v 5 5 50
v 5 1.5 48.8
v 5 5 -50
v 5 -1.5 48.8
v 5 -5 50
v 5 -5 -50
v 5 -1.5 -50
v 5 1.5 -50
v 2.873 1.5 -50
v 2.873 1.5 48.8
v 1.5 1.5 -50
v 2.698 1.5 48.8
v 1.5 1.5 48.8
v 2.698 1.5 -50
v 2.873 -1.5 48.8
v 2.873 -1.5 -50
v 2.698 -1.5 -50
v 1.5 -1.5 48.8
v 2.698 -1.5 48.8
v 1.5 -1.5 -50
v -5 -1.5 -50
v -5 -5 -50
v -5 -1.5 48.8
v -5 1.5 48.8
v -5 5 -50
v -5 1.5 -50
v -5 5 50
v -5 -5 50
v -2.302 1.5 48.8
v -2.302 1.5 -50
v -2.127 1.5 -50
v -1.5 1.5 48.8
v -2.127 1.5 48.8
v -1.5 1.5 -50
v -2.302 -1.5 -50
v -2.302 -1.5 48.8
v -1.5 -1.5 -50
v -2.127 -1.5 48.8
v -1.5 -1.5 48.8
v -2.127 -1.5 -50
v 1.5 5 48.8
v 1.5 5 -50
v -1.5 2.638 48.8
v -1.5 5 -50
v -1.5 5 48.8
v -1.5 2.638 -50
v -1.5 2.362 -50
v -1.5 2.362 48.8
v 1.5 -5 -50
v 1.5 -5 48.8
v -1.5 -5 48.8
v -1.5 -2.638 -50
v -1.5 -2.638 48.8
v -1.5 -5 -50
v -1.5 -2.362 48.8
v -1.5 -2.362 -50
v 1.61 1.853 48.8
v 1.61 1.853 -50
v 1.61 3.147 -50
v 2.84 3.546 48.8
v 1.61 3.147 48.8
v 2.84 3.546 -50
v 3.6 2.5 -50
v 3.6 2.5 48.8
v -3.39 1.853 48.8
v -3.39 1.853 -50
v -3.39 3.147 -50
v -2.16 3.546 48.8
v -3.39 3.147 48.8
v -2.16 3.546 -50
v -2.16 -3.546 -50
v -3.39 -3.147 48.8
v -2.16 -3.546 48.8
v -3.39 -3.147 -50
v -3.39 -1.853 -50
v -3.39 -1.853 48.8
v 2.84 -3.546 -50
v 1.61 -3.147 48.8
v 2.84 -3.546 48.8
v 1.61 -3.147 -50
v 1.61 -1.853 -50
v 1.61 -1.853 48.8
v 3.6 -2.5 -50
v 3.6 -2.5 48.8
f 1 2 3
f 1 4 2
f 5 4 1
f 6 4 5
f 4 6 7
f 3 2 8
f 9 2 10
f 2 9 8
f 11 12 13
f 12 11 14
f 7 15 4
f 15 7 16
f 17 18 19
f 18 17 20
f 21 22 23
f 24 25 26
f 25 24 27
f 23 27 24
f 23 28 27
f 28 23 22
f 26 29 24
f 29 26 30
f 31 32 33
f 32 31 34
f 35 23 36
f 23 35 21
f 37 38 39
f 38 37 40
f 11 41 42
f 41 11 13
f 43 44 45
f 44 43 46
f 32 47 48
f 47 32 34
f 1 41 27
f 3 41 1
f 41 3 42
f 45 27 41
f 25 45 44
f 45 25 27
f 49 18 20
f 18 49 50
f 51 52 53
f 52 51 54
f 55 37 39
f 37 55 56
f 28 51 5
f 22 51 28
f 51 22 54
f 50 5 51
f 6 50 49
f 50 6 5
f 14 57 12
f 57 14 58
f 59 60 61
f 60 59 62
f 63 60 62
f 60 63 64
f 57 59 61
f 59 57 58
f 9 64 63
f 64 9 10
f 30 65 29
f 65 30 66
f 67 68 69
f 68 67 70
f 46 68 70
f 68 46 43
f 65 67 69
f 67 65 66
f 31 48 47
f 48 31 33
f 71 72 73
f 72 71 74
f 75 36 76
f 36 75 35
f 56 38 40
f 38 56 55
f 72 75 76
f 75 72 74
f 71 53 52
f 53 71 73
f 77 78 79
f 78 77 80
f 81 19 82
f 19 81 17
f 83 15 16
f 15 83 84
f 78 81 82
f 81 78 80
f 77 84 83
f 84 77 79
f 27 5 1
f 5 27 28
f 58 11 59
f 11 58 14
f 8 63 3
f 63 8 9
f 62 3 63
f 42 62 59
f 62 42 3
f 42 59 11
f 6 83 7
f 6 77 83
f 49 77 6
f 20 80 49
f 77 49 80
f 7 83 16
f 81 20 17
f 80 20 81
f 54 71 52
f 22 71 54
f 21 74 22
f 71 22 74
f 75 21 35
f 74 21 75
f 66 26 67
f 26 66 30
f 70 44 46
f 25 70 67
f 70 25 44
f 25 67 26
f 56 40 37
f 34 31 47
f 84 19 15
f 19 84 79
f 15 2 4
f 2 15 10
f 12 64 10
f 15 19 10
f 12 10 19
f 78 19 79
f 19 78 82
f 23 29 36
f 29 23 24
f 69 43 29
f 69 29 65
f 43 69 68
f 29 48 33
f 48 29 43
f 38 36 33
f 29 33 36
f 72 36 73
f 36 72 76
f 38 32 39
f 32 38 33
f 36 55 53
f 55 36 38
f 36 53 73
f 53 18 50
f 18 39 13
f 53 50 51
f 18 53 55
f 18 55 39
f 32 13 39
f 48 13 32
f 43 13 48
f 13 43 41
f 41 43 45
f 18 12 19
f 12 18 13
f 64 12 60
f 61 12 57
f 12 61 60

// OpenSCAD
// Parameters
cross_section_width_mm = 10; //[5:20:0.5]
cross_section_height_mm = 10; //[5:20:0.5]
length_mm = 100; //[50:200:1]
centered = 1; //[0:1:1]
corner_hole = 1; //[0:1:1]
wall_thickness_mm = 1.2; //[0.6:2.4:0.1]
slot_opening_mm = 3.0; //[1.5:5.0:0.1]
slot_depth_mm = 2.8; //[1.5:4.5:0.1]
center_bore_diameter_mm = 4.2; //[2.0:7.0:0.1]
corner_hole_diameter_mm = 2.2; //[1.0:4.0:0.1]
corner_hole_inset_mm = 2.5; //[1.5:4.0:0.1]
overlap_mm = 1.0; //[0.5:2.0:0.1]

// Extrusion - complete geometry
module extrusion() {
  color("Silver") {
    difference() {
      // Main body
      cube([cross_section_width_mm, cross_section_height_mm, length_mm], center=true);
      
      // T-slot channels
      union() {
        translate([cross_section_width_mm/2 - (slot_depth_mm + overlap_mm)/2, 0, 0])
          cube([slot_depth_mm + overlap_mm, slot_opening_mm, length_mm + 2*overlap_mm], center=true);
        translate([-cross_section_width_mm/2 + (slot_depth_mm + overlap_mm)/2, 0, 0])
          cube([slot_depth_mm + overlap_mm, slot_opening_mm, length_mm + 2*overlap_mm], center=true);
        translate([0, cross_section_height_mm/2 - (slot_depth_mm + overlap_mm)/2, 0])
          cube([slot_opening_mm, slot_depth_mm + overlap_mm, length_mm + 2*overlap_mm], center=true);
        translate([0, -cross_section_height_mm/2 + (slot_depth_mm + overlap_mm)/2, 0])
          cube([slot_opening_mm, slot_depth_mm + overlap_mm, length_mm + 2*overlap_mm], center=true);
      }
      
      // Center bore
      translate([0, 0, 0])
        cylinder(r=center_bore_diameter_mm/2, h=length_mm + 2*overlap_mm, center=true);
      
      // Corner holes
      if (corner_hole) {
        union() {
          translate([cross_section_width_mm/2 - corner_hole_inset_mm, cross_section_height_mm/2 - corner_hole_inset_mm, 0])
            cylinder(r=corner_hole_diameter_mm/2, h=length_mm + 2*overlap_mm, center=true);
          translate([-cross_section_width_mm/2 + corner_hole_inset_mm, cross_section_height_mm/2 - corner_hole_inset_mm, 0])
            cylinder(r=corner_hole_diameter_mm/2, h=length_mm + 2*overlap_mm, center=true);
          translate([-cross_section_width_mm/2 + corner_hole_inset_mm, -cross_section_height_mm/2 + corner_hole_inset_mm, 0])
            cylinder(r=corner_hole_diameter_mm/2, h=length_mm + 2*overlap_mm, center=true);
          translate([cross_section_width_mm/2 - corner_hole_inset_mm, -cross_section_height_mm/2 + corner_hole_inset_mm, 0])
            cylinder(r=corner_hole_diameter_mm/2, h=length_mm + 2*overlap_mm, center=true);
        }
      }
    }
  }
}

// Extrusion Cross Section - complete geometry
module extrusion_cross_section() {
  color("DimGray") {
    cube([cross_section_width_mm, cross_section_height_mm, wall_thickness_mm], center=true);
  }
}

// Box Corner Profile Section - complete geometry
module box_corner_profile_section() {
  color("DimGray") {
    cube([cross_section_width_mm/2 - wall_thickness_mm/2, cross_section_height_mm/2 - wall_thickness_mm/2, wall_thickness_mm], center=true);
  }
}

// Box Corner Profile Sections - complete geometry
module box_corner_profile_sections() {
  color("DimGray") {
    union() {
      translate([cross_section_width_mm/4, cross_section_height_mm/4, length_mm/2 - wall_thickness_mm/2])
        box_corner_profile_section();
      translate([-cross_section_width_mm/4, cross_section_height_mm/4, length_mm/2 - wall_thickness_mm/2])
        box_corner_profile_section();
      translate([cross_section_width_mm/4, -cross_section_height_mm/4, length_mm/2 - wall_thickness_mm/2])
        box_corner_profile_section();
      translate([-cross_section_width_mm/4, -cross_section_height_mm/4, length_mm/2 - wall_thickness_mm/2])
        box_corner_profile_section();
    }
  }
}

// Assembly
module assembly() {
  extrusion();
  translate([0, 0, length_mm/2 - wall_thickness_mm/2]) extrusion_cross_section();
  box_corner_profile_sections();
}

assembly();
